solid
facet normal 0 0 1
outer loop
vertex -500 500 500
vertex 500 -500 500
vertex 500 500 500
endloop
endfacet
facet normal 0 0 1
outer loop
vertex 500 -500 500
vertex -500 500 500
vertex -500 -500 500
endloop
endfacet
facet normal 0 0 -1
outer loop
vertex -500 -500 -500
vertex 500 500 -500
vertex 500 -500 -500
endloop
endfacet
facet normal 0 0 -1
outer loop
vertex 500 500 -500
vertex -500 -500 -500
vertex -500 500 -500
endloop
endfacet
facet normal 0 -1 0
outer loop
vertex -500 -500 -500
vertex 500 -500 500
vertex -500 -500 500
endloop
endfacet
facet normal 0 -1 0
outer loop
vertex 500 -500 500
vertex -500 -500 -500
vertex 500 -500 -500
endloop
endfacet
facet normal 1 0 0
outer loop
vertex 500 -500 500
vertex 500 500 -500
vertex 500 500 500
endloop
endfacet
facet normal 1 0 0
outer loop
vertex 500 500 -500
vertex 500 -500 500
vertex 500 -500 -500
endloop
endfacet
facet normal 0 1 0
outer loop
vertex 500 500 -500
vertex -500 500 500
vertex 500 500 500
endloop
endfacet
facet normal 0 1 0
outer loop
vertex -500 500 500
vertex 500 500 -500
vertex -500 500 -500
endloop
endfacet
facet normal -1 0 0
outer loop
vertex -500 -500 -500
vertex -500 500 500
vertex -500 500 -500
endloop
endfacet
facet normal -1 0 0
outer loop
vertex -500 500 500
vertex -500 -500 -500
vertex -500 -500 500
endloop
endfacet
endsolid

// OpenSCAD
/*
   Copyright 2015-2020 Scott Bezek and the splitflap contributors

   Licensed under the Apache License, Version 2.0 (the "License");
   you may not use this file except in compliance with the License.
   You may obtain a copy of the License at

       http://www.apache.org/licenses/LICENSE-2.0

   Unless required by applicable law or agreed to in writing, software
   distributed under the License is distributed on an "AS IS" BASIS,
   WITHOUT WARRANTIES OR CONDITIONS OF ANY KIND, either express or implied.
   See the License for the specific language governing permissions and
   limitations under the License.
*/

module legacyAssert(truth, msg="(no messsage provided)") {
    if (!truth) {
        // Intentionally don't close the <div> tag to make the entire console red
        echo(str(
            "<div style='background-color:#FF0000'>",
            "<br><br>",
            "####################",
            "<br><br>",
            "<span style='font-size: x-large'>ASSERTION ERROR!</span>",
            "<br><br>",
            msg,
            "<br><br>",
            "####################",
            "<br><br>"));

        color("red") {
            cube([1000, 1000, 1000], center=true);
        }
    }
}

required_widgets = 24;
widgets = 12 + 3;

legacyAssert(widgets >= required_widgets, str("Not enough widgets! Required ", required_widgets, " but found ", widgets));
